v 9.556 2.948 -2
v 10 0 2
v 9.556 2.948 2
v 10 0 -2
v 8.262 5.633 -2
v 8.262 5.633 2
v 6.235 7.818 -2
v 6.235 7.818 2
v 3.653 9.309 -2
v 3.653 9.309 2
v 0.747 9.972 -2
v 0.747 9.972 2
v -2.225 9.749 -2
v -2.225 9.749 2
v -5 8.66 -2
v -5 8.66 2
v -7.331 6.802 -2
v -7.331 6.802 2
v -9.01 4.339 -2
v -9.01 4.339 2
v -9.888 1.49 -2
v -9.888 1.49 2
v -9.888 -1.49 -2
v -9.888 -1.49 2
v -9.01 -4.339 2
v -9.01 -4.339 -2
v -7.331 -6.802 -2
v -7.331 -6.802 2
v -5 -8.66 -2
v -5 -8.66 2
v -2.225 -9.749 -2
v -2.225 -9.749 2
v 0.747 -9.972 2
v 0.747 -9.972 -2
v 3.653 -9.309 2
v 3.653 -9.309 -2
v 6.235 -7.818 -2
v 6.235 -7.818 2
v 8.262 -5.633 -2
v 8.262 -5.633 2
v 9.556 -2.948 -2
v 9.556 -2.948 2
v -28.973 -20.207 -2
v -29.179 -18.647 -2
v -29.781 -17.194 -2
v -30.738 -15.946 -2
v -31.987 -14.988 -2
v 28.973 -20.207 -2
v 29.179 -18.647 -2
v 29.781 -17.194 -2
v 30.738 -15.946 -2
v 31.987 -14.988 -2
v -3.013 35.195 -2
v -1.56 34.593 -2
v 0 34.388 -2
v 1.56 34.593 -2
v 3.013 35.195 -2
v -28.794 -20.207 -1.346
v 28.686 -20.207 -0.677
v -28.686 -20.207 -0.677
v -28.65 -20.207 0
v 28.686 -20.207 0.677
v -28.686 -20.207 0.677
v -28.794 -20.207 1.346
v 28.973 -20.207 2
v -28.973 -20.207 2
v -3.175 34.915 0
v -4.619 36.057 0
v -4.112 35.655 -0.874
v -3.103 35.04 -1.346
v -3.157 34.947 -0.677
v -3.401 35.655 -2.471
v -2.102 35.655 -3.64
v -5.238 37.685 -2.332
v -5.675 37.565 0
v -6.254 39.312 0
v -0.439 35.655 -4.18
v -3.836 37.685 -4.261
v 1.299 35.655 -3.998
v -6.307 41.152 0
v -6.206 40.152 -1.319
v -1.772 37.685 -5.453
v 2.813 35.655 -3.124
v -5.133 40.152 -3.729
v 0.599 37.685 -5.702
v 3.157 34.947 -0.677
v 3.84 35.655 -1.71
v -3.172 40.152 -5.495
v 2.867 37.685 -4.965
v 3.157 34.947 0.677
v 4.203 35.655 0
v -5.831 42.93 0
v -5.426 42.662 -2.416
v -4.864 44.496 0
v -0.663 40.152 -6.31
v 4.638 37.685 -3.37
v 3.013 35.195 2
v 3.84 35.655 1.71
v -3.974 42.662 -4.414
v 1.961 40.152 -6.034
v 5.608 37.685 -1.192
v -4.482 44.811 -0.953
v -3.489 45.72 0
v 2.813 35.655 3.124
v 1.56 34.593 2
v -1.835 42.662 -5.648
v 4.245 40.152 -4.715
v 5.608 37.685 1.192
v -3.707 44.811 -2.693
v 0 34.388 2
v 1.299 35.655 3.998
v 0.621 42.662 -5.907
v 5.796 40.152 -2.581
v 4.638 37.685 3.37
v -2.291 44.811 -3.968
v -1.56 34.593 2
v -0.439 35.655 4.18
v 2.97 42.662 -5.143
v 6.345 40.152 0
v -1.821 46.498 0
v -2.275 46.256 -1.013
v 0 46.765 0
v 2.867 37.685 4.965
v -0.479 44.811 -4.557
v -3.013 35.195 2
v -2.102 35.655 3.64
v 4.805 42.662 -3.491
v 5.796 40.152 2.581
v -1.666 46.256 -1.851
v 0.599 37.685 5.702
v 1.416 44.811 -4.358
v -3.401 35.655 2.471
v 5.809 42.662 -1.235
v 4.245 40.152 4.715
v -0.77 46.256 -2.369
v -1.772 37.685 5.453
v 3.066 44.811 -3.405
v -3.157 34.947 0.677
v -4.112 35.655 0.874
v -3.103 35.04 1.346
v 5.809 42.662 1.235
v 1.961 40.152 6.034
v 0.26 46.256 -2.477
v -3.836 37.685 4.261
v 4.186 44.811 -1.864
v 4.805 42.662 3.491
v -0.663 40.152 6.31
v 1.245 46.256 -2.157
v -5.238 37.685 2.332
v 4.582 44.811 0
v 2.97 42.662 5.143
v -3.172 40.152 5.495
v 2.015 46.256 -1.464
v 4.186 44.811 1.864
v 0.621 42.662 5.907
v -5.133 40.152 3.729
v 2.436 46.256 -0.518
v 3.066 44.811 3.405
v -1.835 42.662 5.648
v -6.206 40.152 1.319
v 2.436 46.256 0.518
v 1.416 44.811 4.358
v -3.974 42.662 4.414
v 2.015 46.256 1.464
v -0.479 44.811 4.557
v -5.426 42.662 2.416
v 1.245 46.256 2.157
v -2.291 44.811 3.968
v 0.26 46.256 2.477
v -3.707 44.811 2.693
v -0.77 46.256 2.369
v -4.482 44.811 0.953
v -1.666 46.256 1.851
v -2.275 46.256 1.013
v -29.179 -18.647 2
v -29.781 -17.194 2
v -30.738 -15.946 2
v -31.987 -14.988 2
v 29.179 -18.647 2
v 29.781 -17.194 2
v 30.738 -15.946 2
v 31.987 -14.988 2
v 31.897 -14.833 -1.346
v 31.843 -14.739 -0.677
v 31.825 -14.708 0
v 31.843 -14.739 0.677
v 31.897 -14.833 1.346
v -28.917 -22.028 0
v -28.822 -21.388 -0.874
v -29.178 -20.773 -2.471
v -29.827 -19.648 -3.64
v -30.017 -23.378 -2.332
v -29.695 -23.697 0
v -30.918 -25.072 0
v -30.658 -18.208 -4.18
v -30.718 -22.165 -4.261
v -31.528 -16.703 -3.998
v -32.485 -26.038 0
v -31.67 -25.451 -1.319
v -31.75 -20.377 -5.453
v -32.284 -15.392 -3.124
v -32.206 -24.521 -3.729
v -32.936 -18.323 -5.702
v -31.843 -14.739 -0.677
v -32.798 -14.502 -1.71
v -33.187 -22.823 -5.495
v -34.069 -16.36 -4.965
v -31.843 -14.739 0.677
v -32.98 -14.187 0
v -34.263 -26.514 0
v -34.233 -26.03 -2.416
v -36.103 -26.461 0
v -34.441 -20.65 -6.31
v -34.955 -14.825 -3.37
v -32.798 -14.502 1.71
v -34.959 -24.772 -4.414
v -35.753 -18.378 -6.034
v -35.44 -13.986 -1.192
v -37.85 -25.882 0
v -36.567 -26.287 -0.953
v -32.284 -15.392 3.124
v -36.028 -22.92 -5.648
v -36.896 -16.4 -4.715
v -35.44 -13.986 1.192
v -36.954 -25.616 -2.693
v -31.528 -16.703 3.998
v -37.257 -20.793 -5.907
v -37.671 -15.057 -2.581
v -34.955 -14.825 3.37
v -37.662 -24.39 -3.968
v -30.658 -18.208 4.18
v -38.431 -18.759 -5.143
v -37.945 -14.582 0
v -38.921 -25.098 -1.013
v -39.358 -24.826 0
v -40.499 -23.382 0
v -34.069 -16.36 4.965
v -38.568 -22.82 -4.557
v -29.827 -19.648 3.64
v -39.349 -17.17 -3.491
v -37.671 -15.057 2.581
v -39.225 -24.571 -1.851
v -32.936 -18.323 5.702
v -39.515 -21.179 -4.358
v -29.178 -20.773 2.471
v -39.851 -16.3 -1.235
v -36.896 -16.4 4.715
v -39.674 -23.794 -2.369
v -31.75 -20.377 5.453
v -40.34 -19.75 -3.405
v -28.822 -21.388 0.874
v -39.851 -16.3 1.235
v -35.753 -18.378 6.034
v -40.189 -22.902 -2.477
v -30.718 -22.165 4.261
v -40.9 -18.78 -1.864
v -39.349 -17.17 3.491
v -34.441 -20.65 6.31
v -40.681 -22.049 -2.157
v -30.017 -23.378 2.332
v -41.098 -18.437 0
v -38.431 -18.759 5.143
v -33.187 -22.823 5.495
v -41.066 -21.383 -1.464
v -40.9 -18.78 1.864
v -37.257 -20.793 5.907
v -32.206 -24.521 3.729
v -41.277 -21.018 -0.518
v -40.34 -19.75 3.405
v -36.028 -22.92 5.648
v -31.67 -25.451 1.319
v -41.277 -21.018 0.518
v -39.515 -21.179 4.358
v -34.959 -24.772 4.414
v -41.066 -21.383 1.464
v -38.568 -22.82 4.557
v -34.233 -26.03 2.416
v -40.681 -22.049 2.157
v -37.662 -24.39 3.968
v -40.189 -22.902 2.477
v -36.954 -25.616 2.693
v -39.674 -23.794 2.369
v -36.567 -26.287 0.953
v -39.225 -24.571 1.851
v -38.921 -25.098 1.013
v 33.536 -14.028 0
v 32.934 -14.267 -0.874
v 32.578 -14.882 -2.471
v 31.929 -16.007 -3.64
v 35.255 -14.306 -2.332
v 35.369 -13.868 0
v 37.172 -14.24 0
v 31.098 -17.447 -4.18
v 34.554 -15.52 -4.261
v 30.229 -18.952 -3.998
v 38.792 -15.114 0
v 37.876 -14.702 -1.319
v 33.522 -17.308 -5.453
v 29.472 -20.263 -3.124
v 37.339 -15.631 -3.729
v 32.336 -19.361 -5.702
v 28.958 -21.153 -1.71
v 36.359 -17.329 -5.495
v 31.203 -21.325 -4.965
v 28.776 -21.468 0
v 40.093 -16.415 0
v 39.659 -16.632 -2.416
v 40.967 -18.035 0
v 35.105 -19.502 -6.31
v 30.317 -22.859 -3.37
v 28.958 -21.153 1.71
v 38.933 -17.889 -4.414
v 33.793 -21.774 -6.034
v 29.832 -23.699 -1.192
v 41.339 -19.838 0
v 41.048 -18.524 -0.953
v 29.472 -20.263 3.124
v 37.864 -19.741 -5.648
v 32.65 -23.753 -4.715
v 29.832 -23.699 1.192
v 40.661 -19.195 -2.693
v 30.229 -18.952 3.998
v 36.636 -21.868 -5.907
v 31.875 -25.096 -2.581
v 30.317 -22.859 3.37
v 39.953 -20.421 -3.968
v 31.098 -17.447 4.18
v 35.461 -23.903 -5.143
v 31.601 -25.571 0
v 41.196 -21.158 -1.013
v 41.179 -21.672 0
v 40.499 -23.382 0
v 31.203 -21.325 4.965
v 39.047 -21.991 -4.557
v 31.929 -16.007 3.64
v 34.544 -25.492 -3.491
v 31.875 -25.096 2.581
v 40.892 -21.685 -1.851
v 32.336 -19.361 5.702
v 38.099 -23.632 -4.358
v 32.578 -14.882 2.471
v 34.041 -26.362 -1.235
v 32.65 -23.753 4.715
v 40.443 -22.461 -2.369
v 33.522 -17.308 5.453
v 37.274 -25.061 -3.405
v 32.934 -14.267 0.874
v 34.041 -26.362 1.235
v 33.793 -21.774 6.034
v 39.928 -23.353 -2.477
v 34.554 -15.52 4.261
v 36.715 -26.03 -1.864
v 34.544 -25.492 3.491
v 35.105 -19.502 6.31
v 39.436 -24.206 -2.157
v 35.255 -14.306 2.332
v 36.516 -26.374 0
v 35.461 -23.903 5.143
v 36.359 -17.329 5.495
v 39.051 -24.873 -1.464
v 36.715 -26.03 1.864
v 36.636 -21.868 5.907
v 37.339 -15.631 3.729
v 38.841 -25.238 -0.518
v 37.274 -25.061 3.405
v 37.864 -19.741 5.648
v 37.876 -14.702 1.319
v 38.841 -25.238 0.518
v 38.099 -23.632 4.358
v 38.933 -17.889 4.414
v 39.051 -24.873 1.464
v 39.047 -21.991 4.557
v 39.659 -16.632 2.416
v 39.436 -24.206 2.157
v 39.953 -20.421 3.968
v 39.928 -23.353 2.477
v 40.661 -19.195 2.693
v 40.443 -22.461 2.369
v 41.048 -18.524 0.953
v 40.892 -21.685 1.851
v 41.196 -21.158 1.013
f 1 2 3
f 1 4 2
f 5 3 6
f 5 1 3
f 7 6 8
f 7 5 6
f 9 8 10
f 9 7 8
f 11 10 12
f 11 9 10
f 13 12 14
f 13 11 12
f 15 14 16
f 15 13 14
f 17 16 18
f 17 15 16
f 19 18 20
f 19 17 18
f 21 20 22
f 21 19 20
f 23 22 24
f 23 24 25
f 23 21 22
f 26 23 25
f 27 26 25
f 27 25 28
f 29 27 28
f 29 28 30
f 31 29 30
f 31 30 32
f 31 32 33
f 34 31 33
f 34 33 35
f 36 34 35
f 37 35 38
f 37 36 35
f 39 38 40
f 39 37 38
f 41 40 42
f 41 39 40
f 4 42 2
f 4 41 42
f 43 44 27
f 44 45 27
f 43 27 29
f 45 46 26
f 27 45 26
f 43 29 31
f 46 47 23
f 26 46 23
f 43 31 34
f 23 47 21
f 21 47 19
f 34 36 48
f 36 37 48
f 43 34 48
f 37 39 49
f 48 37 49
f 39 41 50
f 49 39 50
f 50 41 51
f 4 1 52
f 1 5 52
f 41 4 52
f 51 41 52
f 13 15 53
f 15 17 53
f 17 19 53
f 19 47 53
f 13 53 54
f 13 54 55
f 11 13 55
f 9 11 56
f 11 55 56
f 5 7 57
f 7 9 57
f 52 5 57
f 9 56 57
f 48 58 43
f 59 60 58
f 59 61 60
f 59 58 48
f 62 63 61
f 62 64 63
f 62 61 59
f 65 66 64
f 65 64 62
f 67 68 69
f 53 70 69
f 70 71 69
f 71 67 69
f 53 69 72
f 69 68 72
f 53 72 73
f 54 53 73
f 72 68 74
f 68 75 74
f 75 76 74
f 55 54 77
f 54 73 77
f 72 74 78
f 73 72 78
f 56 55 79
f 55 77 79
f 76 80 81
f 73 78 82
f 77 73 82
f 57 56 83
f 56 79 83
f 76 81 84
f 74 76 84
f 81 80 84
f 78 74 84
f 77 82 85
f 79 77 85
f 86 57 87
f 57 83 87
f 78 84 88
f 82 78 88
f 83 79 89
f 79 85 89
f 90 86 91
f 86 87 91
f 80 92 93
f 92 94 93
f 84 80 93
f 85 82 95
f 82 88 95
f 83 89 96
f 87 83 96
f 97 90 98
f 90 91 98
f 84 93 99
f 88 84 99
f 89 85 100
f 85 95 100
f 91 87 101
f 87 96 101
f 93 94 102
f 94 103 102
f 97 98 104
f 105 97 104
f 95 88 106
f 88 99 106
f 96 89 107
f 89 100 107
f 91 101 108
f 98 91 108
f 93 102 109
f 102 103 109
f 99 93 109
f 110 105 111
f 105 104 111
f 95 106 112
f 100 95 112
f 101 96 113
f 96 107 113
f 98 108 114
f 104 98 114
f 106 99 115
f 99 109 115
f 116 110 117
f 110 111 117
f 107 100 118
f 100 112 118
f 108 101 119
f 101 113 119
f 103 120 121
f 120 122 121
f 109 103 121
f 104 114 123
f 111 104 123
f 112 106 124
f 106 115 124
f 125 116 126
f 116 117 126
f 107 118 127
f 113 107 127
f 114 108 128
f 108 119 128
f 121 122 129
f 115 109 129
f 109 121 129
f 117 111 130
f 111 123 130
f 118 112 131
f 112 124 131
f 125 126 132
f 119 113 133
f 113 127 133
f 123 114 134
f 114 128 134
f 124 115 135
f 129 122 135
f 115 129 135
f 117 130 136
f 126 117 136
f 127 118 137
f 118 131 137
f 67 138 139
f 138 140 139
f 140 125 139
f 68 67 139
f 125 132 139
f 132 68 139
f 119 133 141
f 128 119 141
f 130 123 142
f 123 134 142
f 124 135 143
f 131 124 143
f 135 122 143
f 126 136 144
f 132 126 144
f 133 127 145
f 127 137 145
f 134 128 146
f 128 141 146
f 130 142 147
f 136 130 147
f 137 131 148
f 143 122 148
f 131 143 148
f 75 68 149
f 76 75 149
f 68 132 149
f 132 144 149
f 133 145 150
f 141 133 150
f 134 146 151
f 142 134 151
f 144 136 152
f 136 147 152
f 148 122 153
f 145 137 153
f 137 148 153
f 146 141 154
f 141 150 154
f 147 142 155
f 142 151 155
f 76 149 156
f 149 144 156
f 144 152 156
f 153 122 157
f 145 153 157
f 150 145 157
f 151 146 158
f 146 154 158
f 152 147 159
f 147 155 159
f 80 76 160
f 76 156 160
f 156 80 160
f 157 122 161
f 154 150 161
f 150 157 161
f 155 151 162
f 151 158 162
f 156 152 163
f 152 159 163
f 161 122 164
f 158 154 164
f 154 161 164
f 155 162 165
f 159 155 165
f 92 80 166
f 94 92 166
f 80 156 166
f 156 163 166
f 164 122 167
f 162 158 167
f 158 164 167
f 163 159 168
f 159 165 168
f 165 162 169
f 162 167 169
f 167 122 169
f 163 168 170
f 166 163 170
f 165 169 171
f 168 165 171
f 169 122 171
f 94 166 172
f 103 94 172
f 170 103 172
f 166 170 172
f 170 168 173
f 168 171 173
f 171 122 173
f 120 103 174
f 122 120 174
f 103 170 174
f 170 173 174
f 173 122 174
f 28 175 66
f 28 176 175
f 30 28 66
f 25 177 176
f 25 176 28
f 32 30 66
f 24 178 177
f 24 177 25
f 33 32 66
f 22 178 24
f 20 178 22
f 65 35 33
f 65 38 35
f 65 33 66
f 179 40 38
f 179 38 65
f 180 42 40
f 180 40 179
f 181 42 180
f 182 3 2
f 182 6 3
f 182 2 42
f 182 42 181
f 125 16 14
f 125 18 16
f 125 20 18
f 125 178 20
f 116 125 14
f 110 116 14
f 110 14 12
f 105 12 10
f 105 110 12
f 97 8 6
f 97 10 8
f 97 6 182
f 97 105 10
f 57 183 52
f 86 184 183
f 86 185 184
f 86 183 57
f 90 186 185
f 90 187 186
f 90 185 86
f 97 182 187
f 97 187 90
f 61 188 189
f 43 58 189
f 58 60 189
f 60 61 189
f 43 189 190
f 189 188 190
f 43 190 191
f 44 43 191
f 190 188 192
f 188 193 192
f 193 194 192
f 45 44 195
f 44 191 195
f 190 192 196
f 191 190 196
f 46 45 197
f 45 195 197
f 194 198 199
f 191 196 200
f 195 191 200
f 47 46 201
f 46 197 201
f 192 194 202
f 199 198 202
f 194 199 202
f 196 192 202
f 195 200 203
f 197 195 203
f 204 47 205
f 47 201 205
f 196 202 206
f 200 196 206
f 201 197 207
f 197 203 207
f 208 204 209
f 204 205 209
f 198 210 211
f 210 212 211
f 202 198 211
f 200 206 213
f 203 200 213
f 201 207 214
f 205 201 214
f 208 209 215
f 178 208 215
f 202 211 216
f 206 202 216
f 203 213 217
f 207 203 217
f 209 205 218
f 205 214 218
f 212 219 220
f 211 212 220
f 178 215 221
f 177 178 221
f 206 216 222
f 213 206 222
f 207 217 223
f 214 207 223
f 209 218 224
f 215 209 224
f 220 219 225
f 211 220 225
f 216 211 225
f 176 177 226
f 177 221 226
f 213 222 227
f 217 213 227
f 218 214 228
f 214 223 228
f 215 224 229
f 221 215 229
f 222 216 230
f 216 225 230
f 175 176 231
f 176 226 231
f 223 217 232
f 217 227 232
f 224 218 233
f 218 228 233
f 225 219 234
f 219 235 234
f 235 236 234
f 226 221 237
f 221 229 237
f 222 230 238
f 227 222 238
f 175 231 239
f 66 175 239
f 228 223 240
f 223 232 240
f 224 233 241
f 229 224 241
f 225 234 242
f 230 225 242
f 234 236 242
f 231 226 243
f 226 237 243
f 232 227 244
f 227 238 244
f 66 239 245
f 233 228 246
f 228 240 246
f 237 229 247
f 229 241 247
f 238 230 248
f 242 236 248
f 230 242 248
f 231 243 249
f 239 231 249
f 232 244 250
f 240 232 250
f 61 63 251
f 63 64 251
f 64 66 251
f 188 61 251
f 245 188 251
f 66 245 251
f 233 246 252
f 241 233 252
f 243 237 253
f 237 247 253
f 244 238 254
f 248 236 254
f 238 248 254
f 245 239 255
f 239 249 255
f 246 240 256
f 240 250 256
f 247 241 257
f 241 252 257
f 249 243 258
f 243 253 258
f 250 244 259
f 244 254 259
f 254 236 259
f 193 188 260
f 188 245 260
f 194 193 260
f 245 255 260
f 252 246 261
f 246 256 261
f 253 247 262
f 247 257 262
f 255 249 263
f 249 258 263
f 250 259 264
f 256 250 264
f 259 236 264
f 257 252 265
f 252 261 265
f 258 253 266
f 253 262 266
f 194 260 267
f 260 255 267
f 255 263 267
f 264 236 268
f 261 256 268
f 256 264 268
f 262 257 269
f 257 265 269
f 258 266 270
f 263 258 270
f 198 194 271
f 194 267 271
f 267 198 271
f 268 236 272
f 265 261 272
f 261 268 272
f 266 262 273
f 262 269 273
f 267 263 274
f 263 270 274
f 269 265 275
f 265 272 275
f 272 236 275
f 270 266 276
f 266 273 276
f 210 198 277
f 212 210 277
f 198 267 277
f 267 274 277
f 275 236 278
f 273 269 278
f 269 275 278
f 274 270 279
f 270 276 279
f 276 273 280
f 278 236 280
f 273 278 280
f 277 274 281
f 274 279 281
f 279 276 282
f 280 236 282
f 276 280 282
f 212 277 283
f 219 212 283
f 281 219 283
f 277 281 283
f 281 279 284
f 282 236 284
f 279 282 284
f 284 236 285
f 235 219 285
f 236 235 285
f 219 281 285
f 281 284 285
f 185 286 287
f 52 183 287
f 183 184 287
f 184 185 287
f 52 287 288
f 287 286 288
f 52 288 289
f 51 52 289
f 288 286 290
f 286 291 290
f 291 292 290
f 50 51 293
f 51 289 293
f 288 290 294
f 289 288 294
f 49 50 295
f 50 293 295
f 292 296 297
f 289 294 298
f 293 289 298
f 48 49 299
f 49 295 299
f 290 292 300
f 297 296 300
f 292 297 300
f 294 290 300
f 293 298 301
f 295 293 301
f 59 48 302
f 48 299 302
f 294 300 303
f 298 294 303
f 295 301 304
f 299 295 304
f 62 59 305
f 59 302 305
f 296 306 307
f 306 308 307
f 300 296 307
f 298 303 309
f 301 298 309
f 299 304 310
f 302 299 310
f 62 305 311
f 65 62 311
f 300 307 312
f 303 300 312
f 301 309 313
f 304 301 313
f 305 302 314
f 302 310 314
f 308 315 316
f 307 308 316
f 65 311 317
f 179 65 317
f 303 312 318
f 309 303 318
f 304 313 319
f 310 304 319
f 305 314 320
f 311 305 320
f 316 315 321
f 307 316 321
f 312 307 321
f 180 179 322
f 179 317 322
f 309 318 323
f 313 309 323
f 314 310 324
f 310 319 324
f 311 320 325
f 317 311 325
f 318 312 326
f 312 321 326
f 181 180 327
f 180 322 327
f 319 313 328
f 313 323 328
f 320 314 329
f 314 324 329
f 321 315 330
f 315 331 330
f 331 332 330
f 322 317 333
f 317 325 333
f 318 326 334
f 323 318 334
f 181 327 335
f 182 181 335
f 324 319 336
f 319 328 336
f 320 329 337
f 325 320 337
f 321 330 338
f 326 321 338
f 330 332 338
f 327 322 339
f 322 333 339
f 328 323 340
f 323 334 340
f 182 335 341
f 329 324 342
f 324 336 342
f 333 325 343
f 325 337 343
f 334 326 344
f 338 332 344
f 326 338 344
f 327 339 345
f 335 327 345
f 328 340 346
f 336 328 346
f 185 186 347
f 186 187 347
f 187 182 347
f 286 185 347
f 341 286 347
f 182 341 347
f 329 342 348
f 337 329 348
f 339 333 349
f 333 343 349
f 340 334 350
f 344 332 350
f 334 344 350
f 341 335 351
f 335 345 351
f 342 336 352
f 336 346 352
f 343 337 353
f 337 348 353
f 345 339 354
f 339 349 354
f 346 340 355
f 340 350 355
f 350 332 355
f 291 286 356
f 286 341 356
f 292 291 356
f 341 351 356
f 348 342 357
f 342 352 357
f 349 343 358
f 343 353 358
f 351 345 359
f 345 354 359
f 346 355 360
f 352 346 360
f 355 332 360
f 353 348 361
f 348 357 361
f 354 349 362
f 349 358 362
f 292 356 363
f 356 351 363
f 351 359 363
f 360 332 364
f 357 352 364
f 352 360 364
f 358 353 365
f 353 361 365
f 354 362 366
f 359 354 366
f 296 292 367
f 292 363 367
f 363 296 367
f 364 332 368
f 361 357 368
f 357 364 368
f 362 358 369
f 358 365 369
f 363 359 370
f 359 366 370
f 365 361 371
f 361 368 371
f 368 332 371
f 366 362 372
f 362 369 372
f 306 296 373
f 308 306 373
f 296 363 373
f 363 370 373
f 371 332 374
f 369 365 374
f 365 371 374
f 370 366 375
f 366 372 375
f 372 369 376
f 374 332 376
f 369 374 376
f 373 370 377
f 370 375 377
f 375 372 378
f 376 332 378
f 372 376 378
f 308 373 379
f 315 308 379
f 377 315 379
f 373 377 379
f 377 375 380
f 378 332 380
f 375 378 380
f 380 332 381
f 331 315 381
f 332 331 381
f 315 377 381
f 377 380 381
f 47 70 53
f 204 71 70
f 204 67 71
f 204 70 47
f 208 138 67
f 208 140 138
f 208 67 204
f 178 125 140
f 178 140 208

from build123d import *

# Parameters (mm, degrees)
ESQUISSE1_R                  = 10
BOSS_EXTRU_1_DEPTH           = 2
R_P_TITION_CIRCULAIRE1_COUNT = 3


with BuildPart() as part:
    # Esquisse1 → Boss.-Extru.1 (new, symmetric)
    with BuildSketch(Plane.XY):
        Polygon((0, 40.414518843), (-35, -20.207259422), (35, -20.207259422), align=None)
        Circle(ESQUISSE1_R, mode=Mode.SUBTRACT)
    extrude(amount=BOSS_EXTRU_1_DEPTH, both=True)

    # Esquisse3 → Révolution1 (revolve)
    with BuildSketch(Plane.XY):
        with BuildLine():
            Line((0, 46.764518843), (0, 34.064518843))
            ThreePointArc((0, 34.064518843), (-6.35, 40.414518843), (0, 46.764518843))
        make_face()
    r_volution1 = revolve(axis=Axis((0, 46.764518843, 0), (0, -1, 0)))

    # Répétition circulaire1: Révolution1 ×3 about axis
    r_p_tition_circulaire1_axis = Axis((0, 0, 0), (0, 0, 1))
    for i in range(1, R_P_TITION_CIRCULAIRE1_COUNT):
        add(r_volution1.rotate(r_p_tition_circulaire1_axis, i * 360 / R_P_TITION_CIRCULAIRE1_COUNT))


solid = part.part
